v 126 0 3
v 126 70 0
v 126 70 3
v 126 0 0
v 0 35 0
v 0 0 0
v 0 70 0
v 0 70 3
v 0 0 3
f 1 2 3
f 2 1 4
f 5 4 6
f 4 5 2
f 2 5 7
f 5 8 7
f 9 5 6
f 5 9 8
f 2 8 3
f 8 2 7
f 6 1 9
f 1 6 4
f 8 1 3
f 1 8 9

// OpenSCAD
// Open-top rectangular buffer tank for a mini horizontal gel-electrophoresis box. NOVEL general part.
//

inner_l = 120;
inner_w = 70;
height  = 40;
wall    = 3;
floor   = 3;

$fn = 48;

inner_h = height - floor;

difference() {
    cube([inner_l + 2 * wall, inner_w, height]);
    translate([0, 0, floor]) cube([inner_l + 2 * wall, inner_w, height - floor]);   // hollow, open top
    translate([0, inner_w / 2 - 1.5, floor]) cube([60, inner_w, height - floor + 10]);      // raised platform (spans full width)
    for (y = [-1, 1])
        translate([0, inner_w / 2, -1]) rotate([-90, 0, 0]) cylinder(h = height + 2, d = 2);   // electrode holes, horizontal along X, at y = +/- wall (centre of the wall thickness)
}
